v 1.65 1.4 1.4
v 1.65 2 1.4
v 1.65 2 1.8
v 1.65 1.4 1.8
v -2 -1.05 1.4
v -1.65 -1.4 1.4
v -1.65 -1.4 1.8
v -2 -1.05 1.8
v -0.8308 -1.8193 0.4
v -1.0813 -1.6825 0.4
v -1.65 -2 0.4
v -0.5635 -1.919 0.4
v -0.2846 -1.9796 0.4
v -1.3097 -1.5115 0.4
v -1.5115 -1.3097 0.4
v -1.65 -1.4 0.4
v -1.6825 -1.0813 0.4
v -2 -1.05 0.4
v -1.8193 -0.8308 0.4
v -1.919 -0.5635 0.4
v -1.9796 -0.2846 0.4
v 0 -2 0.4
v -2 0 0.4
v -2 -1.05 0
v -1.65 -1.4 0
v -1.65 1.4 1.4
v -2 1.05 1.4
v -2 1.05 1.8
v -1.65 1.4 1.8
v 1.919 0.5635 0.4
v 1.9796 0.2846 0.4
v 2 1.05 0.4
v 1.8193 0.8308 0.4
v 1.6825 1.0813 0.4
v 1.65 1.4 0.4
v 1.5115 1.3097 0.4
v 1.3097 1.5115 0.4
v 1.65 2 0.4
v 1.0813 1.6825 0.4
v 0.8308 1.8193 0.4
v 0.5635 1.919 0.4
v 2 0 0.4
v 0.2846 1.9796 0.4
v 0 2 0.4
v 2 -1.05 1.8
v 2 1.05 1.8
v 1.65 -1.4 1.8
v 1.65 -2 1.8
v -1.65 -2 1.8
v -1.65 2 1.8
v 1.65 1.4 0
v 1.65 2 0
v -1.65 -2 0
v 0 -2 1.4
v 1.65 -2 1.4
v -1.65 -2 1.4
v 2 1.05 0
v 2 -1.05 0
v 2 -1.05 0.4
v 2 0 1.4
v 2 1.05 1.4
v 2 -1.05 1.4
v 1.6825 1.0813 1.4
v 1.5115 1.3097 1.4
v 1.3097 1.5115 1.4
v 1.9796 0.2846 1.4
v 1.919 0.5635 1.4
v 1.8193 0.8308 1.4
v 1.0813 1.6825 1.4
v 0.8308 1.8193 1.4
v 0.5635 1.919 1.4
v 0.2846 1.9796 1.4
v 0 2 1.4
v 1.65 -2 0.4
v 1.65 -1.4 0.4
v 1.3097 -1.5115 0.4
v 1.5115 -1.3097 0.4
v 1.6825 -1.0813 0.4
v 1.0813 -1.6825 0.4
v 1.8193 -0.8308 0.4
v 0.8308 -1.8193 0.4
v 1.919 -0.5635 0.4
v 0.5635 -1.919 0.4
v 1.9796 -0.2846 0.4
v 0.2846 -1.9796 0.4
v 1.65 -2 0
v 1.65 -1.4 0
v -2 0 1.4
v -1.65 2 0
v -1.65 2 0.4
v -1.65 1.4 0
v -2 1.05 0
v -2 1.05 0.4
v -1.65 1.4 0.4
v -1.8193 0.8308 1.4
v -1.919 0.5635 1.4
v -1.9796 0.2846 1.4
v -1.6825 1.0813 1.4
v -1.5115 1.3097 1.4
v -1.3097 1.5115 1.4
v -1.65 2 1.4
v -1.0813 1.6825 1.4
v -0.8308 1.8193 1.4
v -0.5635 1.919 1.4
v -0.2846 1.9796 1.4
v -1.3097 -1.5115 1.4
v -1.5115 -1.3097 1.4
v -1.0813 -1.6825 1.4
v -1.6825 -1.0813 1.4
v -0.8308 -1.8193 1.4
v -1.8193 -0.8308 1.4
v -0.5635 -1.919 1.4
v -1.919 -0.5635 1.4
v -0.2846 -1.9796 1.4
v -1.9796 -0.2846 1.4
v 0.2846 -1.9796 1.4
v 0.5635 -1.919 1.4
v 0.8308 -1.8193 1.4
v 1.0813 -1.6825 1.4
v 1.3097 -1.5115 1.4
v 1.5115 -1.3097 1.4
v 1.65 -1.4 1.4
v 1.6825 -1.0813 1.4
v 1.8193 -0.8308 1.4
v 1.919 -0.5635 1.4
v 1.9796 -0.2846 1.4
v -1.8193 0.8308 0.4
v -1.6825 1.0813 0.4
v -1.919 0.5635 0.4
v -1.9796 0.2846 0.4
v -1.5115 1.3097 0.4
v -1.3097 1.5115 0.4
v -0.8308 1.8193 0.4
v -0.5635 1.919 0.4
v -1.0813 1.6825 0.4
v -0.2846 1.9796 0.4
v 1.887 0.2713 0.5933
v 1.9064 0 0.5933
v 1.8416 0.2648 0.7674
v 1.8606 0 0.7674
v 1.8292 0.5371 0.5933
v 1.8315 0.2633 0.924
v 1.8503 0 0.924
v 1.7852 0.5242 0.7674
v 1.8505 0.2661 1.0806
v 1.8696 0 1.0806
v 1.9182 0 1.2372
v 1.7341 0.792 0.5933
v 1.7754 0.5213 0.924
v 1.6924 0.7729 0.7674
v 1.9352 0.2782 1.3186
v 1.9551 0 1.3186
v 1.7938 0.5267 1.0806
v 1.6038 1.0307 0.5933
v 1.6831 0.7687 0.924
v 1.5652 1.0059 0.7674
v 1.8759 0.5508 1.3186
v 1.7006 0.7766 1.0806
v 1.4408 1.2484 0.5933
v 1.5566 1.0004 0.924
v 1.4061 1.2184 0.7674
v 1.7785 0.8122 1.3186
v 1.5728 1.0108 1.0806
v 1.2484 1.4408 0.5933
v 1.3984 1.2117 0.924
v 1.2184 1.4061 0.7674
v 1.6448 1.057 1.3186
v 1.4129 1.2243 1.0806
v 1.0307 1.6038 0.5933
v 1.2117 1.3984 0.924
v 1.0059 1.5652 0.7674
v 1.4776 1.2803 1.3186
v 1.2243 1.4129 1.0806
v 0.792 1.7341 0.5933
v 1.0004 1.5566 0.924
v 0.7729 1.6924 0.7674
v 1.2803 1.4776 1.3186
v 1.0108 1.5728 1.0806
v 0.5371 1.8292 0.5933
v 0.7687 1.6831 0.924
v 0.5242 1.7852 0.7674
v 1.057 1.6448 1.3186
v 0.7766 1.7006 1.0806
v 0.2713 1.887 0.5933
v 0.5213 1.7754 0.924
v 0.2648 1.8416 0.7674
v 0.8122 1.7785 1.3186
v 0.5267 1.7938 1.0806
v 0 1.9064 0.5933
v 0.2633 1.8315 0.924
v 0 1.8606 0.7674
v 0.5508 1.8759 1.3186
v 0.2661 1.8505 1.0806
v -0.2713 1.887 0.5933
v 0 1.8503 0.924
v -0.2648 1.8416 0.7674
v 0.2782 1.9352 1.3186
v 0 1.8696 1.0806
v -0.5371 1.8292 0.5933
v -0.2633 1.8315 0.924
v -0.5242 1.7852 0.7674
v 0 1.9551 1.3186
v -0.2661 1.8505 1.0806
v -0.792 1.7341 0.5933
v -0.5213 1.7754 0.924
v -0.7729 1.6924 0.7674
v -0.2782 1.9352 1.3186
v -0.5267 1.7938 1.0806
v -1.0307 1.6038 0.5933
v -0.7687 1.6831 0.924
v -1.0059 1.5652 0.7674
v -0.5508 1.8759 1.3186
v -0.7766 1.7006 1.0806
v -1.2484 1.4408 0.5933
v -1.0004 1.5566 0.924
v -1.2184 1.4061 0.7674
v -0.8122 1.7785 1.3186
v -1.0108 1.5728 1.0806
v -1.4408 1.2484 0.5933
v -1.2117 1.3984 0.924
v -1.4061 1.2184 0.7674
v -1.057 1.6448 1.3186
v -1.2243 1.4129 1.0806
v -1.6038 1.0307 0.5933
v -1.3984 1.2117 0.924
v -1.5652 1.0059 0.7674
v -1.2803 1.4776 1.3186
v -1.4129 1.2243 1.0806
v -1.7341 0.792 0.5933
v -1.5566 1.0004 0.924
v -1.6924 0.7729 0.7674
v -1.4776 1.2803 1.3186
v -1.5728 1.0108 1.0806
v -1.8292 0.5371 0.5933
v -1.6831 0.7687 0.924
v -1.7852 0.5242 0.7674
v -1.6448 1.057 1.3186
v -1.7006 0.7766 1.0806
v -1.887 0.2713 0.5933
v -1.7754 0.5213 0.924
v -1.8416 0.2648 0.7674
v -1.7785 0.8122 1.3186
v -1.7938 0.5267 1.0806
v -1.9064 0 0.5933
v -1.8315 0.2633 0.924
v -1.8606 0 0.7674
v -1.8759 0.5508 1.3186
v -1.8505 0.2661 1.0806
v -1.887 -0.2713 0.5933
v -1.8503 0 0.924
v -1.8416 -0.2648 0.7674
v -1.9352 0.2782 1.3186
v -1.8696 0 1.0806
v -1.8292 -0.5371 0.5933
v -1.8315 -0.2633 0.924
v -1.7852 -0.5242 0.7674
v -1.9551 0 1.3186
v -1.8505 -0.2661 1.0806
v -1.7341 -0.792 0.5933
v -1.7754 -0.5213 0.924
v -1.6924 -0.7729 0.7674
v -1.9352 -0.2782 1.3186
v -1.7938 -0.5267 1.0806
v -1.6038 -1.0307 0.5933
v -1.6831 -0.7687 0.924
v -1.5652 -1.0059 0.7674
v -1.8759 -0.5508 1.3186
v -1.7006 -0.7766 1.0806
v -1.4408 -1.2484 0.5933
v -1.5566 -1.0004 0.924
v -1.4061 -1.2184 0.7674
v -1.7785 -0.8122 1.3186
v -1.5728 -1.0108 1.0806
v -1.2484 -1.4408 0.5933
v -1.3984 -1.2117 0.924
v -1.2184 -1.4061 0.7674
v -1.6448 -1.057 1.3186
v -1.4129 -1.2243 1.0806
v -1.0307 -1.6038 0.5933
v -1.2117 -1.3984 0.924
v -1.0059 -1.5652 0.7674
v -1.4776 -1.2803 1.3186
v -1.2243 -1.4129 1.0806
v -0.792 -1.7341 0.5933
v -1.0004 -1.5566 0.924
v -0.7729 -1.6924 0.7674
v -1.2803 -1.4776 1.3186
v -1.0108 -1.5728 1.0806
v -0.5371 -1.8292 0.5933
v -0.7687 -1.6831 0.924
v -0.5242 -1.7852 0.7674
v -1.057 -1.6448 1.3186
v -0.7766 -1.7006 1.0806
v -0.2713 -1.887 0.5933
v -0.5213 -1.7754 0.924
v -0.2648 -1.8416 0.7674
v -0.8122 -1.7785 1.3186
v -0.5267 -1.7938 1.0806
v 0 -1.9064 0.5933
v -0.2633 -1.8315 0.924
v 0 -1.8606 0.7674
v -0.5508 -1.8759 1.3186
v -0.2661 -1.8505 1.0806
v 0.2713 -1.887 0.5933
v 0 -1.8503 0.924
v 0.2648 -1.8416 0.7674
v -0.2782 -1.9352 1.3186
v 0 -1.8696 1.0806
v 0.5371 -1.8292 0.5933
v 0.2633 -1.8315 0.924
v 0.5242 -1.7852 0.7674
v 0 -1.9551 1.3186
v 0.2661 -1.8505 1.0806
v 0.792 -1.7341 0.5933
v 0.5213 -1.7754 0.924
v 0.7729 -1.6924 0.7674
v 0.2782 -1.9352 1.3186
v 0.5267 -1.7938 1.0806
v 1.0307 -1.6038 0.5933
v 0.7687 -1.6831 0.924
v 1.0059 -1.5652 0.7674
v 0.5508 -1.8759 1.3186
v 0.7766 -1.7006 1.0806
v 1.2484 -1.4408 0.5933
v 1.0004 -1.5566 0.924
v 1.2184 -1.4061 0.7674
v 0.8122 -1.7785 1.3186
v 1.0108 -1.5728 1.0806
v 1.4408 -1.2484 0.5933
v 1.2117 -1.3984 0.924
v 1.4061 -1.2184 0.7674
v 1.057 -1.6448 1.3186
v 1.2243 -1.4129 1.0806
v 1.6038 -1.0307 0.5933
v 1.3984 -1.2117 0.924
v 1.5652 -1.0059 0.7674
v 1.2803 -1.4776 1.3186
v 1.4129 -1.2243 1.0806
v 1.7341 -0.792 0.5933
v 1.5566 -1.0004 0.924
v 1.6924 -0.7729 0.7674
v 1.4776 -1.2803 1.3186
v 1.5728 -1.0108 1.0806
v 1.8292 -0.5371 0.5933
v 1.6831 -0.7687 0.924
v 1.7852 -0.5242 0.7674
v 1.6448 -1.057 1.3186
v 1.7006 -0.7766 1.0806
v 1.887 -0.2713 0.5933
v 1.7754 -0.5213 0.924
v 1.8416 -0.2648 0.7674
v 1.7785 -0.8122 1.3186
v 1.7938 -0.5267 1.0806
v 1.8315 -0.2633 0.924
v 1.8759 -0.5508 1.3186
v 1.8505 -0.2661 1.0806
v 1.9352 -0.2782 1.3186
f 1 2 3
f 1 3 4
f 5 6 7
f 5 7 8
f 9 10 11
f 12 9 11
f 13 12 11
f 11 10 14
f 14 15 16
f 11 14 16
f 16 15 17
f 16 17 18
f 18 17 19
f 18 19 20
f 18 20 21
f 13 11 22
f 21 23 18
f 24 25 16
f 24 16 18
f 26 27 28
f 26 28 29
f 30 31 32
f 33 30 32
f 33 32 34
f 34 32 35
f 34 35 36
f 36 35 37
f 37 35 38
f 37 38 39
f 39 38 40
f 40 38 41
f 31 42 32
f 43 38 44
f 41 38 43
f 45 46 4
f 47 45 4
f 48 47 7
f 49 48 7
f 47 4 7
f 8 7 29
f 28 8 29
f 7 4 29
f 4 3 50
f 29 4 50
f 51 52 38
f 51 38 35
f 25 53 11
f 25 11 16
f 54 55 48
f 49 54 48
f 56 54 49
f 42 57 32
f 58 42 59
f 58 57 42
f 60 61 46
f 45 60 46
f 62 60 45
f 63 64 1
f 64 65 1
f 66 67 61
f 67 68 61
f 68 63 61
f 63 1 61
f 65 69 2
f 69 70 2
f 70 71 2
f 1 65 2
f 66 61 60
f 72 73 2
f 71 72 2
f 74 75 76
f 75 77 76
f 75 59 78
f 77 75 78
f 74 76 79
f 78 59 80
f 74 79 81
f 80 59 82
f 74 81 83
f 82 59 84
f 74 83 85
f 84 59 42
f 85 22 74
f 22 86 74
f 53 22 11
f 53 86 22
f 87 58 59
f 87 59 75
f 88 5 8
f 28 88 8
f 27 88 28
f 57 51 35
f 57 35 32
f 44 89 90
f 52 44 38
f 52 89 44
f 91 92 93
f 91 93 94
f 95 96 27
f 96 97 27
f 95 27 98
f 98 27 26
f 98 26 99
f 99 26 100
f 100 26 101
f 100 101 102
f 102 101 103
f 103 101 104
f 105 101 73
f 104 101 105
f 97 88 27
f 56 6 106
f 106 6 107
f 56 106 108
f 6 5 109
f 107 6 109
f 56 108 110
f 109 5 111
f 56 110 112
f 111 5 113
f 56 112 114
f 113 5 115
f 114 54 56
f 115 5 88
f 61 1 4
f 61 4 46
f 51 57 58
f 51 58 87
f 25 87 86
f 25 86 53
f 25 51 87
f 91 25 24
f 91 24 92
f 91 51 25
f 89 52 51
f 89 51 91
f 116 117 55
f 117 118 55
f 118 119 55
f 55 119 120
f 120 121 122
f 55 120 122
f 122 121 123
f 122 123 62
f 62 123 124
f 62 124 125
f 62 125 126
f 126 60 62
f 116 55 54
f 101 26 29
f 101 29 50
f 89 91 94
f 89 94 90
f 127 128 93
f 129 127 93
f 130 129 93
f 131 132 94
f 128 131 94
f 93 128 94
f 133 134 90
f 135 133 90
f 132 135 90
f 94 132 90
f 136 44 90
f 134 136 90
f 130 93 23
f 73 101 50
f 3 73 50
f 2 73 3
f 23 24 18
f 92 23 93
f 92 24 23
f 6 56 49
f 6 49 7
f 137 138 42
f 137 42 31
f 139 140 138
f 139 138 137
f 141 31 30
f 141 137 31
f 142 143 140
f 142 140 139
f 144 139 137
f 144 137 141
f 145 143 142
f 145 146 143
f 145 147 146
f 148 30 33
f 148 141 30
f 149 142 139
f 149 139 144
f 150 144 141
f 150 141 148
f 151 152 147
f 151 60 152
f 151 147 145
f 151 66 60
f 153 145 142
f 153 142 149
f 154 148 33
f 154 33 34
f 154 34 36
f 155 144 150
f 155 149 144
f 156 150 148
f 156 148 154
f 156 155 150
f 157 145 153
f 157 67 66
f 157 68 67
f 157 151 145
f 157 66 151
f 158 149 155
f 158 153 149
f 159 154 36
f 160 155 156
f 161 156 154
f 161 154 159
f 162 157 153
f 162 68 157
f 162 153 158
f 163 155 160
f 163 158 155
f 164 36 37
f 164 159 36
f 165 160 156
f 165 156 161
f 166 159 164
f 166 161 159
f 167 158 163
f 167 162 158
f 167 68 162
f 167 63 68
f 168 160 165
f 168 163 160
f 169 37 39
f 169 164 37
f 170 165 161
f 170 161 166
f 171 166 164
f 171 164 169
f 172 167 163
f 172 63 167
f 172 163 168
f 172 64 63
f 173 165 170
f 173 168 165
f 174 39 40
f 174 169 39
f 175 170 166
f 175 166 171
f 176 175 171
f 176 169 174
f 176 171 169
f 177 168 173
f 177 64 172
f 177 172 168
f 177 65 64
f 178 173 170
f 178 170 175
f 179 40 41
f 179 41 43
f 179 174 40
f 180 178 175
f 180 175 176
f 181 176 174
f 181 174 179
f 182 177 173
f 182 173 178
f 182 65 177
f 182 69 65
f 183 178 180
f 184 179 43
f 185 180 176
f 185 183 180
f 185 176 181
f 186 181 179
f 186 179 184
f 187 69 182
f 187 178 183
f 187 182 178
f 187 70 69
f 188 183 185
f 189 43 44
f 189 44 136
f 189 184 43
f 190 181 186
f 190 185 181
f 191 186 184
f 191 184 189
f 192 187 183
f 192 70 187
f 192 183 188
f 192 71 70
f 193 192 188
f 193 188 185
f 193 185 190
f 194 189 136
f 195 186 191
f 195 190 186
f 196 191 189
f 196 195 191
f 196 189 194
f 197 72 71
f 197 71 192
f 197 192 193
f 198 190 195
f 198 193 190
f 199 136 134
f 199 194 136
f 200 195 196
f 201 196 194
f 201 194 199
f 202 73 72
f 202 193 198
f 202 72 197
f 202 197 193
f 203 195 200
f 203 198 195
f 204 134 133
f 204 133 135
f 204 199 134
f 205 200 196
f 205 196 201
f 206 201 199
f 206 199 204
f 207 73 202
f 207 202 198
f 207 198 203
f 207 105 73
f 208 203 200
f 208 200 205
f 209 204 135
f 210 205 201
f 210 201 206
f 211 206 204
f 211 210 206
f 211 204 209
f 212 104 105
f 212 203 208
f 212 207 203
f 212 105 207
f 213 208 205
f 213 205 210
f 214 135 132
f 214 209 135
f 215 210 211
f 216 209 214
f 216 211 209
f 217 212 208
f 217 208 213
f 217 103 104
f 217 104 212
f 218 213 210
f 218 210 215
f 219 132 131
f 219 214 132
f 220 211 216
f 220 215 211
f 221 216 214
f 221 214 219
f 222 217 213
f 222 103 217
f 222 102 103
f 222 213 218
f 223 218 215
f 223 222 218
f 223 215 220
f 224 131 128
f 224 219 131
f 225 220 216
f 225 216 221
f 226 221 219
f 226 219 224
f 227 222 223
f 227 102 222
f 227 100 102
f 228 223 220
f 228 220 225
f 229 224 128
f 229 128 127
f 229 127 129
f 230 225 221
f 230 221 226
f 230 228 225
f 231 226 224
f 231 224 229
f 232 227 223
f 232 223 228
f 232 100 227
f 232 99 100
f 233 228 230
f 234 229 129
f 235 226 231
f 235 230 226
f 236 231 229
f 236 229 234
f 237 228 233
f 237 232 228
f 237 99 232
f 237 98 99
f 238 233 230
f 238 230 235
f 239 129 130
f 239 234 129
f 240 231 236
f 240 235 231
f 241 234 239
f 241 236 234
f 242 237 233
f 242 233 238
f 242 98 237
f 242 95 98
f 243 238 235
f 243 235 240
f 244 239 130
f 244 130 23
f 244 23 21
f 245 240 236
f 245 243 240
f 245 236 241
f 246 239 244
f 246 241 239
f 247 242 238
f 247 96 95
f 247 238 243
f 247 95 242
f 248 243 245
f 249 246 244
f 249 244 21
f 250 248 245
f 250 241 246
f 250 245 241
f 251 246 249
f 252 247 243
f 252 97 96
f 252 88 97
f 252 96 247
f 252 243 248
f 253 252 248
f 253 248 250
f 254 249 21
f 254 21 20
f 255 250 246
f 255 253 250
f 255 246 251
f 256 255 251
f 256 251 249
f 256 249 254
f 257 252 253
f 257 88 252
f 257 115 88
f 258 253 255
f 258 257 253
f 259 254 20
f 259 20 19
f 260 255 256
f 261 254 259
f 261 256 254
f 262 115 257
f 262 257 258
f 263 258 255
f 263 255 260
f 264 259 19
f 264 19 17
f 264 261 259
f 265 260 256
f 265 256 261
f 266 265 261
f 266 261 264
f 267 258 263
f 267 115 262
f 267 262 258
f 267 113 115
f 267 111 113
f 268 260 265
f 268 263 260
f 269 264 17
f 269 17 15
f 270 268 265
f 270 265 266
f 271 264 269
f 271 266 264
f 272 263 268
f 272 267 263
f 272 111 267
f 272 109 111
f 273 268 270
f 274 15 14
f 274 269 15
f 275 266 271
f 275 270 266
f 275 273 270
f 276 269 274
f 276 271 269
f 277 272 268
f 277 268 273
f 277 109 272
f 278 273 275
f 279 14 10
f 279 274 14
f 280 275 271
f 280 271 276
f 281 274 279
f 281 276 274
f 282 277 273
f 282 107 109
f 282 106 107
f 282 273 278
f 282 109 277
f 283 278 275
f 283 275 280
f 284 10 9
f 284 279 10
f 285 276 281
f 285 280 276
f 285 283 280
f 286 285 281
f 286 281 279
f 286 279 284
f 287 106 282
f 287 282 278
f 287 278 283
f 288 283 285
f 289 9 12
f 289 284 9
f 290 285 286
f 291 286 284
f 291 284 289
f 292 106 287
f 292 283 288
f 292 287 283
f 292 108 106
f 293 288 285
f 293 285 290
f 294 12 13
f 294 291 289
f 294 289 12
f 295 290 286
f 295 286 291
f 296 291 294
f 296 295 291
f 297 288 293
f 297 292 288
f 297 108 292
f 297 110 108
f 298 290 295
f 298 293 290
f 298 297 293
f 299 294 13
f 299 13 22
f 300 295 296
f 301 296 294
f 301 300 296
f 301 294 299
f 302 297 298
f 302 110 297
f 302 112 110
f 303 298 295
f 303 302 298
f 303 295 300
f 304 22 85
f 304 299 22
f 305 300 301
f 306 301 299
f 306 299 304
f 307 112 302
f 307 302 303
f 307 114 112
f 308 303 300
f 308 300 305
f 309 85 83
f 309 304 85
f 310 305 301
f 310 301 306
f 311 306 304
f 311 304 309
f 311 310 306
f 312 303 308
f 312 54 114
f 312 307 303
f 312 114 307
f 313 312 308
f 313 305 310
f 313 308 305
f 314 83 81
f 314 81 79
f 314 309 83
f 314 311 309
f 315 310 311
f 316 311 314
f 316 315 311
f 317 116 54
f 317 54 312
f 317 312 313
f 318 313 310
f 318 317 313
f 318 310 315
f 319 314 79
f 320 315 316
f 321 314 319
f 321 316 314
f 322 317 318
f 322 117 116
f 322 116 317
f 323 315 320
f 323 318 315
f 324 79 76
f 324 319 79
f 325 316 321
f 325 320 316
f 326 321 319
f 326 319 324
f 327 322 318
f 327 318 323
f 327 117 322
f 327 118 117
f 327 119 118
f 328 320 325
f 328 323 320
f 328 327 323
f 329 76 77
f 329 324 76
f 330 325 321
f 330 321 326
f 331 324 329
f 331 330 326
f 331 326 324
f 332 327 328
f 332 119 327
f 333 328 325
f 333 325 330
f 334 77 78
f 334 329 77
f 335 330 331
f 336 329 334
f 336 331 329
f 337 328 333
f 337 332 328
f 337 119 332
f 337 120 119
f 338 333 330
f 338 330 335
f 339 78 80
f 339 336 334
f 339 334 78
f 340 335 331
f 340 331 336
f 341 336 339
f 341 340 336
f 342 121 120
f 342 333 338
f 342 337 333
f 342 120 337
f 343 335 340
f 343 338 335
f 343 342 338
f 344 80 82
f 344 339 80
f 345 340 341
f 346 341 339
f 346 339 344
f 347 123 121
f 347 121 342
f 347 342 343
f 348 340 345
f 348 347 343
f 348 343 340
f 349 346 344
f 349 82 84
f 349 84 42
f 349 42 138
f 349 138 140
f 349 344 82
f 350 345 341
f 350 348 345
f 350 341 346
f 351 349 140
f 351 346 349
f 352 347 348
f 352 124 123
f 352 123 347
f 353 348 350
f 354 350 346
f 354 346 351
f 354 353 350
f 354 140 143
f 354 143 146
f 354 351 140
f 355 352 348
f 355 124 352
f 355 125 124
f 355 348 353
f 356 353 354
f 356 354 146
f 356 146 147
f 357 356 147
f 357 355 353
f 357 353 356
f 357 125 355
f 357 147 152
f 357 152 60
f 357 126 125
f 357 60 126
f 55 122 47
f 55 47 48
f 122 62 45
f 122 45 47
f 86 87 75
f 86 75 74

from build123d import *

# Parameters (mm, degrees)
BOSS_EXTRUDE1_DEPTH = 1.8


with BuildPart() as part:
    # Sketch1 → Boss-Extrude1 (new body)
    with BuildSketch(Plane.XY):
        Polygon((-1.65, 2), (1.65, 2), (1.65, 1.4), (2, 1.05), (2, -1.05), (1.65, -1.4), (1.65, -2), (-1.65, -2), (-1.65, -1.4), (-2, -1.05), (-2, 1.05), (-1.65, 1.4), align=None)
    extrude(amount=BOSS_EXTRUDE1_DEPTH)

    # Sketch2 → Cut-Revolve1 (revolve, cut)
    with BuildSketch(Plane(origin=(0, 0, 0), x_dir=(1, 0, 0), z_dir=(0, 1, 0))):
        with BuildLine():
            Line((2, -0.4), (3.5, -0.4))
            Line((3.5, -0.4), (3.5, -1.4))
            Line((3.5, -1.4), (2, -1.4))
            add(Edge.make_bspline(
                [(2, -0.4), (1.7, -0.9), (2, -1.4)],
                knots=[0, 0, 0, 1, 1, 1], degree=2))
        make_face()
    revolve(axis=Axis((0, 0, 0.4), (0, 0, 1)), mode=Mode.SUBTRACT)


solid = part.part
